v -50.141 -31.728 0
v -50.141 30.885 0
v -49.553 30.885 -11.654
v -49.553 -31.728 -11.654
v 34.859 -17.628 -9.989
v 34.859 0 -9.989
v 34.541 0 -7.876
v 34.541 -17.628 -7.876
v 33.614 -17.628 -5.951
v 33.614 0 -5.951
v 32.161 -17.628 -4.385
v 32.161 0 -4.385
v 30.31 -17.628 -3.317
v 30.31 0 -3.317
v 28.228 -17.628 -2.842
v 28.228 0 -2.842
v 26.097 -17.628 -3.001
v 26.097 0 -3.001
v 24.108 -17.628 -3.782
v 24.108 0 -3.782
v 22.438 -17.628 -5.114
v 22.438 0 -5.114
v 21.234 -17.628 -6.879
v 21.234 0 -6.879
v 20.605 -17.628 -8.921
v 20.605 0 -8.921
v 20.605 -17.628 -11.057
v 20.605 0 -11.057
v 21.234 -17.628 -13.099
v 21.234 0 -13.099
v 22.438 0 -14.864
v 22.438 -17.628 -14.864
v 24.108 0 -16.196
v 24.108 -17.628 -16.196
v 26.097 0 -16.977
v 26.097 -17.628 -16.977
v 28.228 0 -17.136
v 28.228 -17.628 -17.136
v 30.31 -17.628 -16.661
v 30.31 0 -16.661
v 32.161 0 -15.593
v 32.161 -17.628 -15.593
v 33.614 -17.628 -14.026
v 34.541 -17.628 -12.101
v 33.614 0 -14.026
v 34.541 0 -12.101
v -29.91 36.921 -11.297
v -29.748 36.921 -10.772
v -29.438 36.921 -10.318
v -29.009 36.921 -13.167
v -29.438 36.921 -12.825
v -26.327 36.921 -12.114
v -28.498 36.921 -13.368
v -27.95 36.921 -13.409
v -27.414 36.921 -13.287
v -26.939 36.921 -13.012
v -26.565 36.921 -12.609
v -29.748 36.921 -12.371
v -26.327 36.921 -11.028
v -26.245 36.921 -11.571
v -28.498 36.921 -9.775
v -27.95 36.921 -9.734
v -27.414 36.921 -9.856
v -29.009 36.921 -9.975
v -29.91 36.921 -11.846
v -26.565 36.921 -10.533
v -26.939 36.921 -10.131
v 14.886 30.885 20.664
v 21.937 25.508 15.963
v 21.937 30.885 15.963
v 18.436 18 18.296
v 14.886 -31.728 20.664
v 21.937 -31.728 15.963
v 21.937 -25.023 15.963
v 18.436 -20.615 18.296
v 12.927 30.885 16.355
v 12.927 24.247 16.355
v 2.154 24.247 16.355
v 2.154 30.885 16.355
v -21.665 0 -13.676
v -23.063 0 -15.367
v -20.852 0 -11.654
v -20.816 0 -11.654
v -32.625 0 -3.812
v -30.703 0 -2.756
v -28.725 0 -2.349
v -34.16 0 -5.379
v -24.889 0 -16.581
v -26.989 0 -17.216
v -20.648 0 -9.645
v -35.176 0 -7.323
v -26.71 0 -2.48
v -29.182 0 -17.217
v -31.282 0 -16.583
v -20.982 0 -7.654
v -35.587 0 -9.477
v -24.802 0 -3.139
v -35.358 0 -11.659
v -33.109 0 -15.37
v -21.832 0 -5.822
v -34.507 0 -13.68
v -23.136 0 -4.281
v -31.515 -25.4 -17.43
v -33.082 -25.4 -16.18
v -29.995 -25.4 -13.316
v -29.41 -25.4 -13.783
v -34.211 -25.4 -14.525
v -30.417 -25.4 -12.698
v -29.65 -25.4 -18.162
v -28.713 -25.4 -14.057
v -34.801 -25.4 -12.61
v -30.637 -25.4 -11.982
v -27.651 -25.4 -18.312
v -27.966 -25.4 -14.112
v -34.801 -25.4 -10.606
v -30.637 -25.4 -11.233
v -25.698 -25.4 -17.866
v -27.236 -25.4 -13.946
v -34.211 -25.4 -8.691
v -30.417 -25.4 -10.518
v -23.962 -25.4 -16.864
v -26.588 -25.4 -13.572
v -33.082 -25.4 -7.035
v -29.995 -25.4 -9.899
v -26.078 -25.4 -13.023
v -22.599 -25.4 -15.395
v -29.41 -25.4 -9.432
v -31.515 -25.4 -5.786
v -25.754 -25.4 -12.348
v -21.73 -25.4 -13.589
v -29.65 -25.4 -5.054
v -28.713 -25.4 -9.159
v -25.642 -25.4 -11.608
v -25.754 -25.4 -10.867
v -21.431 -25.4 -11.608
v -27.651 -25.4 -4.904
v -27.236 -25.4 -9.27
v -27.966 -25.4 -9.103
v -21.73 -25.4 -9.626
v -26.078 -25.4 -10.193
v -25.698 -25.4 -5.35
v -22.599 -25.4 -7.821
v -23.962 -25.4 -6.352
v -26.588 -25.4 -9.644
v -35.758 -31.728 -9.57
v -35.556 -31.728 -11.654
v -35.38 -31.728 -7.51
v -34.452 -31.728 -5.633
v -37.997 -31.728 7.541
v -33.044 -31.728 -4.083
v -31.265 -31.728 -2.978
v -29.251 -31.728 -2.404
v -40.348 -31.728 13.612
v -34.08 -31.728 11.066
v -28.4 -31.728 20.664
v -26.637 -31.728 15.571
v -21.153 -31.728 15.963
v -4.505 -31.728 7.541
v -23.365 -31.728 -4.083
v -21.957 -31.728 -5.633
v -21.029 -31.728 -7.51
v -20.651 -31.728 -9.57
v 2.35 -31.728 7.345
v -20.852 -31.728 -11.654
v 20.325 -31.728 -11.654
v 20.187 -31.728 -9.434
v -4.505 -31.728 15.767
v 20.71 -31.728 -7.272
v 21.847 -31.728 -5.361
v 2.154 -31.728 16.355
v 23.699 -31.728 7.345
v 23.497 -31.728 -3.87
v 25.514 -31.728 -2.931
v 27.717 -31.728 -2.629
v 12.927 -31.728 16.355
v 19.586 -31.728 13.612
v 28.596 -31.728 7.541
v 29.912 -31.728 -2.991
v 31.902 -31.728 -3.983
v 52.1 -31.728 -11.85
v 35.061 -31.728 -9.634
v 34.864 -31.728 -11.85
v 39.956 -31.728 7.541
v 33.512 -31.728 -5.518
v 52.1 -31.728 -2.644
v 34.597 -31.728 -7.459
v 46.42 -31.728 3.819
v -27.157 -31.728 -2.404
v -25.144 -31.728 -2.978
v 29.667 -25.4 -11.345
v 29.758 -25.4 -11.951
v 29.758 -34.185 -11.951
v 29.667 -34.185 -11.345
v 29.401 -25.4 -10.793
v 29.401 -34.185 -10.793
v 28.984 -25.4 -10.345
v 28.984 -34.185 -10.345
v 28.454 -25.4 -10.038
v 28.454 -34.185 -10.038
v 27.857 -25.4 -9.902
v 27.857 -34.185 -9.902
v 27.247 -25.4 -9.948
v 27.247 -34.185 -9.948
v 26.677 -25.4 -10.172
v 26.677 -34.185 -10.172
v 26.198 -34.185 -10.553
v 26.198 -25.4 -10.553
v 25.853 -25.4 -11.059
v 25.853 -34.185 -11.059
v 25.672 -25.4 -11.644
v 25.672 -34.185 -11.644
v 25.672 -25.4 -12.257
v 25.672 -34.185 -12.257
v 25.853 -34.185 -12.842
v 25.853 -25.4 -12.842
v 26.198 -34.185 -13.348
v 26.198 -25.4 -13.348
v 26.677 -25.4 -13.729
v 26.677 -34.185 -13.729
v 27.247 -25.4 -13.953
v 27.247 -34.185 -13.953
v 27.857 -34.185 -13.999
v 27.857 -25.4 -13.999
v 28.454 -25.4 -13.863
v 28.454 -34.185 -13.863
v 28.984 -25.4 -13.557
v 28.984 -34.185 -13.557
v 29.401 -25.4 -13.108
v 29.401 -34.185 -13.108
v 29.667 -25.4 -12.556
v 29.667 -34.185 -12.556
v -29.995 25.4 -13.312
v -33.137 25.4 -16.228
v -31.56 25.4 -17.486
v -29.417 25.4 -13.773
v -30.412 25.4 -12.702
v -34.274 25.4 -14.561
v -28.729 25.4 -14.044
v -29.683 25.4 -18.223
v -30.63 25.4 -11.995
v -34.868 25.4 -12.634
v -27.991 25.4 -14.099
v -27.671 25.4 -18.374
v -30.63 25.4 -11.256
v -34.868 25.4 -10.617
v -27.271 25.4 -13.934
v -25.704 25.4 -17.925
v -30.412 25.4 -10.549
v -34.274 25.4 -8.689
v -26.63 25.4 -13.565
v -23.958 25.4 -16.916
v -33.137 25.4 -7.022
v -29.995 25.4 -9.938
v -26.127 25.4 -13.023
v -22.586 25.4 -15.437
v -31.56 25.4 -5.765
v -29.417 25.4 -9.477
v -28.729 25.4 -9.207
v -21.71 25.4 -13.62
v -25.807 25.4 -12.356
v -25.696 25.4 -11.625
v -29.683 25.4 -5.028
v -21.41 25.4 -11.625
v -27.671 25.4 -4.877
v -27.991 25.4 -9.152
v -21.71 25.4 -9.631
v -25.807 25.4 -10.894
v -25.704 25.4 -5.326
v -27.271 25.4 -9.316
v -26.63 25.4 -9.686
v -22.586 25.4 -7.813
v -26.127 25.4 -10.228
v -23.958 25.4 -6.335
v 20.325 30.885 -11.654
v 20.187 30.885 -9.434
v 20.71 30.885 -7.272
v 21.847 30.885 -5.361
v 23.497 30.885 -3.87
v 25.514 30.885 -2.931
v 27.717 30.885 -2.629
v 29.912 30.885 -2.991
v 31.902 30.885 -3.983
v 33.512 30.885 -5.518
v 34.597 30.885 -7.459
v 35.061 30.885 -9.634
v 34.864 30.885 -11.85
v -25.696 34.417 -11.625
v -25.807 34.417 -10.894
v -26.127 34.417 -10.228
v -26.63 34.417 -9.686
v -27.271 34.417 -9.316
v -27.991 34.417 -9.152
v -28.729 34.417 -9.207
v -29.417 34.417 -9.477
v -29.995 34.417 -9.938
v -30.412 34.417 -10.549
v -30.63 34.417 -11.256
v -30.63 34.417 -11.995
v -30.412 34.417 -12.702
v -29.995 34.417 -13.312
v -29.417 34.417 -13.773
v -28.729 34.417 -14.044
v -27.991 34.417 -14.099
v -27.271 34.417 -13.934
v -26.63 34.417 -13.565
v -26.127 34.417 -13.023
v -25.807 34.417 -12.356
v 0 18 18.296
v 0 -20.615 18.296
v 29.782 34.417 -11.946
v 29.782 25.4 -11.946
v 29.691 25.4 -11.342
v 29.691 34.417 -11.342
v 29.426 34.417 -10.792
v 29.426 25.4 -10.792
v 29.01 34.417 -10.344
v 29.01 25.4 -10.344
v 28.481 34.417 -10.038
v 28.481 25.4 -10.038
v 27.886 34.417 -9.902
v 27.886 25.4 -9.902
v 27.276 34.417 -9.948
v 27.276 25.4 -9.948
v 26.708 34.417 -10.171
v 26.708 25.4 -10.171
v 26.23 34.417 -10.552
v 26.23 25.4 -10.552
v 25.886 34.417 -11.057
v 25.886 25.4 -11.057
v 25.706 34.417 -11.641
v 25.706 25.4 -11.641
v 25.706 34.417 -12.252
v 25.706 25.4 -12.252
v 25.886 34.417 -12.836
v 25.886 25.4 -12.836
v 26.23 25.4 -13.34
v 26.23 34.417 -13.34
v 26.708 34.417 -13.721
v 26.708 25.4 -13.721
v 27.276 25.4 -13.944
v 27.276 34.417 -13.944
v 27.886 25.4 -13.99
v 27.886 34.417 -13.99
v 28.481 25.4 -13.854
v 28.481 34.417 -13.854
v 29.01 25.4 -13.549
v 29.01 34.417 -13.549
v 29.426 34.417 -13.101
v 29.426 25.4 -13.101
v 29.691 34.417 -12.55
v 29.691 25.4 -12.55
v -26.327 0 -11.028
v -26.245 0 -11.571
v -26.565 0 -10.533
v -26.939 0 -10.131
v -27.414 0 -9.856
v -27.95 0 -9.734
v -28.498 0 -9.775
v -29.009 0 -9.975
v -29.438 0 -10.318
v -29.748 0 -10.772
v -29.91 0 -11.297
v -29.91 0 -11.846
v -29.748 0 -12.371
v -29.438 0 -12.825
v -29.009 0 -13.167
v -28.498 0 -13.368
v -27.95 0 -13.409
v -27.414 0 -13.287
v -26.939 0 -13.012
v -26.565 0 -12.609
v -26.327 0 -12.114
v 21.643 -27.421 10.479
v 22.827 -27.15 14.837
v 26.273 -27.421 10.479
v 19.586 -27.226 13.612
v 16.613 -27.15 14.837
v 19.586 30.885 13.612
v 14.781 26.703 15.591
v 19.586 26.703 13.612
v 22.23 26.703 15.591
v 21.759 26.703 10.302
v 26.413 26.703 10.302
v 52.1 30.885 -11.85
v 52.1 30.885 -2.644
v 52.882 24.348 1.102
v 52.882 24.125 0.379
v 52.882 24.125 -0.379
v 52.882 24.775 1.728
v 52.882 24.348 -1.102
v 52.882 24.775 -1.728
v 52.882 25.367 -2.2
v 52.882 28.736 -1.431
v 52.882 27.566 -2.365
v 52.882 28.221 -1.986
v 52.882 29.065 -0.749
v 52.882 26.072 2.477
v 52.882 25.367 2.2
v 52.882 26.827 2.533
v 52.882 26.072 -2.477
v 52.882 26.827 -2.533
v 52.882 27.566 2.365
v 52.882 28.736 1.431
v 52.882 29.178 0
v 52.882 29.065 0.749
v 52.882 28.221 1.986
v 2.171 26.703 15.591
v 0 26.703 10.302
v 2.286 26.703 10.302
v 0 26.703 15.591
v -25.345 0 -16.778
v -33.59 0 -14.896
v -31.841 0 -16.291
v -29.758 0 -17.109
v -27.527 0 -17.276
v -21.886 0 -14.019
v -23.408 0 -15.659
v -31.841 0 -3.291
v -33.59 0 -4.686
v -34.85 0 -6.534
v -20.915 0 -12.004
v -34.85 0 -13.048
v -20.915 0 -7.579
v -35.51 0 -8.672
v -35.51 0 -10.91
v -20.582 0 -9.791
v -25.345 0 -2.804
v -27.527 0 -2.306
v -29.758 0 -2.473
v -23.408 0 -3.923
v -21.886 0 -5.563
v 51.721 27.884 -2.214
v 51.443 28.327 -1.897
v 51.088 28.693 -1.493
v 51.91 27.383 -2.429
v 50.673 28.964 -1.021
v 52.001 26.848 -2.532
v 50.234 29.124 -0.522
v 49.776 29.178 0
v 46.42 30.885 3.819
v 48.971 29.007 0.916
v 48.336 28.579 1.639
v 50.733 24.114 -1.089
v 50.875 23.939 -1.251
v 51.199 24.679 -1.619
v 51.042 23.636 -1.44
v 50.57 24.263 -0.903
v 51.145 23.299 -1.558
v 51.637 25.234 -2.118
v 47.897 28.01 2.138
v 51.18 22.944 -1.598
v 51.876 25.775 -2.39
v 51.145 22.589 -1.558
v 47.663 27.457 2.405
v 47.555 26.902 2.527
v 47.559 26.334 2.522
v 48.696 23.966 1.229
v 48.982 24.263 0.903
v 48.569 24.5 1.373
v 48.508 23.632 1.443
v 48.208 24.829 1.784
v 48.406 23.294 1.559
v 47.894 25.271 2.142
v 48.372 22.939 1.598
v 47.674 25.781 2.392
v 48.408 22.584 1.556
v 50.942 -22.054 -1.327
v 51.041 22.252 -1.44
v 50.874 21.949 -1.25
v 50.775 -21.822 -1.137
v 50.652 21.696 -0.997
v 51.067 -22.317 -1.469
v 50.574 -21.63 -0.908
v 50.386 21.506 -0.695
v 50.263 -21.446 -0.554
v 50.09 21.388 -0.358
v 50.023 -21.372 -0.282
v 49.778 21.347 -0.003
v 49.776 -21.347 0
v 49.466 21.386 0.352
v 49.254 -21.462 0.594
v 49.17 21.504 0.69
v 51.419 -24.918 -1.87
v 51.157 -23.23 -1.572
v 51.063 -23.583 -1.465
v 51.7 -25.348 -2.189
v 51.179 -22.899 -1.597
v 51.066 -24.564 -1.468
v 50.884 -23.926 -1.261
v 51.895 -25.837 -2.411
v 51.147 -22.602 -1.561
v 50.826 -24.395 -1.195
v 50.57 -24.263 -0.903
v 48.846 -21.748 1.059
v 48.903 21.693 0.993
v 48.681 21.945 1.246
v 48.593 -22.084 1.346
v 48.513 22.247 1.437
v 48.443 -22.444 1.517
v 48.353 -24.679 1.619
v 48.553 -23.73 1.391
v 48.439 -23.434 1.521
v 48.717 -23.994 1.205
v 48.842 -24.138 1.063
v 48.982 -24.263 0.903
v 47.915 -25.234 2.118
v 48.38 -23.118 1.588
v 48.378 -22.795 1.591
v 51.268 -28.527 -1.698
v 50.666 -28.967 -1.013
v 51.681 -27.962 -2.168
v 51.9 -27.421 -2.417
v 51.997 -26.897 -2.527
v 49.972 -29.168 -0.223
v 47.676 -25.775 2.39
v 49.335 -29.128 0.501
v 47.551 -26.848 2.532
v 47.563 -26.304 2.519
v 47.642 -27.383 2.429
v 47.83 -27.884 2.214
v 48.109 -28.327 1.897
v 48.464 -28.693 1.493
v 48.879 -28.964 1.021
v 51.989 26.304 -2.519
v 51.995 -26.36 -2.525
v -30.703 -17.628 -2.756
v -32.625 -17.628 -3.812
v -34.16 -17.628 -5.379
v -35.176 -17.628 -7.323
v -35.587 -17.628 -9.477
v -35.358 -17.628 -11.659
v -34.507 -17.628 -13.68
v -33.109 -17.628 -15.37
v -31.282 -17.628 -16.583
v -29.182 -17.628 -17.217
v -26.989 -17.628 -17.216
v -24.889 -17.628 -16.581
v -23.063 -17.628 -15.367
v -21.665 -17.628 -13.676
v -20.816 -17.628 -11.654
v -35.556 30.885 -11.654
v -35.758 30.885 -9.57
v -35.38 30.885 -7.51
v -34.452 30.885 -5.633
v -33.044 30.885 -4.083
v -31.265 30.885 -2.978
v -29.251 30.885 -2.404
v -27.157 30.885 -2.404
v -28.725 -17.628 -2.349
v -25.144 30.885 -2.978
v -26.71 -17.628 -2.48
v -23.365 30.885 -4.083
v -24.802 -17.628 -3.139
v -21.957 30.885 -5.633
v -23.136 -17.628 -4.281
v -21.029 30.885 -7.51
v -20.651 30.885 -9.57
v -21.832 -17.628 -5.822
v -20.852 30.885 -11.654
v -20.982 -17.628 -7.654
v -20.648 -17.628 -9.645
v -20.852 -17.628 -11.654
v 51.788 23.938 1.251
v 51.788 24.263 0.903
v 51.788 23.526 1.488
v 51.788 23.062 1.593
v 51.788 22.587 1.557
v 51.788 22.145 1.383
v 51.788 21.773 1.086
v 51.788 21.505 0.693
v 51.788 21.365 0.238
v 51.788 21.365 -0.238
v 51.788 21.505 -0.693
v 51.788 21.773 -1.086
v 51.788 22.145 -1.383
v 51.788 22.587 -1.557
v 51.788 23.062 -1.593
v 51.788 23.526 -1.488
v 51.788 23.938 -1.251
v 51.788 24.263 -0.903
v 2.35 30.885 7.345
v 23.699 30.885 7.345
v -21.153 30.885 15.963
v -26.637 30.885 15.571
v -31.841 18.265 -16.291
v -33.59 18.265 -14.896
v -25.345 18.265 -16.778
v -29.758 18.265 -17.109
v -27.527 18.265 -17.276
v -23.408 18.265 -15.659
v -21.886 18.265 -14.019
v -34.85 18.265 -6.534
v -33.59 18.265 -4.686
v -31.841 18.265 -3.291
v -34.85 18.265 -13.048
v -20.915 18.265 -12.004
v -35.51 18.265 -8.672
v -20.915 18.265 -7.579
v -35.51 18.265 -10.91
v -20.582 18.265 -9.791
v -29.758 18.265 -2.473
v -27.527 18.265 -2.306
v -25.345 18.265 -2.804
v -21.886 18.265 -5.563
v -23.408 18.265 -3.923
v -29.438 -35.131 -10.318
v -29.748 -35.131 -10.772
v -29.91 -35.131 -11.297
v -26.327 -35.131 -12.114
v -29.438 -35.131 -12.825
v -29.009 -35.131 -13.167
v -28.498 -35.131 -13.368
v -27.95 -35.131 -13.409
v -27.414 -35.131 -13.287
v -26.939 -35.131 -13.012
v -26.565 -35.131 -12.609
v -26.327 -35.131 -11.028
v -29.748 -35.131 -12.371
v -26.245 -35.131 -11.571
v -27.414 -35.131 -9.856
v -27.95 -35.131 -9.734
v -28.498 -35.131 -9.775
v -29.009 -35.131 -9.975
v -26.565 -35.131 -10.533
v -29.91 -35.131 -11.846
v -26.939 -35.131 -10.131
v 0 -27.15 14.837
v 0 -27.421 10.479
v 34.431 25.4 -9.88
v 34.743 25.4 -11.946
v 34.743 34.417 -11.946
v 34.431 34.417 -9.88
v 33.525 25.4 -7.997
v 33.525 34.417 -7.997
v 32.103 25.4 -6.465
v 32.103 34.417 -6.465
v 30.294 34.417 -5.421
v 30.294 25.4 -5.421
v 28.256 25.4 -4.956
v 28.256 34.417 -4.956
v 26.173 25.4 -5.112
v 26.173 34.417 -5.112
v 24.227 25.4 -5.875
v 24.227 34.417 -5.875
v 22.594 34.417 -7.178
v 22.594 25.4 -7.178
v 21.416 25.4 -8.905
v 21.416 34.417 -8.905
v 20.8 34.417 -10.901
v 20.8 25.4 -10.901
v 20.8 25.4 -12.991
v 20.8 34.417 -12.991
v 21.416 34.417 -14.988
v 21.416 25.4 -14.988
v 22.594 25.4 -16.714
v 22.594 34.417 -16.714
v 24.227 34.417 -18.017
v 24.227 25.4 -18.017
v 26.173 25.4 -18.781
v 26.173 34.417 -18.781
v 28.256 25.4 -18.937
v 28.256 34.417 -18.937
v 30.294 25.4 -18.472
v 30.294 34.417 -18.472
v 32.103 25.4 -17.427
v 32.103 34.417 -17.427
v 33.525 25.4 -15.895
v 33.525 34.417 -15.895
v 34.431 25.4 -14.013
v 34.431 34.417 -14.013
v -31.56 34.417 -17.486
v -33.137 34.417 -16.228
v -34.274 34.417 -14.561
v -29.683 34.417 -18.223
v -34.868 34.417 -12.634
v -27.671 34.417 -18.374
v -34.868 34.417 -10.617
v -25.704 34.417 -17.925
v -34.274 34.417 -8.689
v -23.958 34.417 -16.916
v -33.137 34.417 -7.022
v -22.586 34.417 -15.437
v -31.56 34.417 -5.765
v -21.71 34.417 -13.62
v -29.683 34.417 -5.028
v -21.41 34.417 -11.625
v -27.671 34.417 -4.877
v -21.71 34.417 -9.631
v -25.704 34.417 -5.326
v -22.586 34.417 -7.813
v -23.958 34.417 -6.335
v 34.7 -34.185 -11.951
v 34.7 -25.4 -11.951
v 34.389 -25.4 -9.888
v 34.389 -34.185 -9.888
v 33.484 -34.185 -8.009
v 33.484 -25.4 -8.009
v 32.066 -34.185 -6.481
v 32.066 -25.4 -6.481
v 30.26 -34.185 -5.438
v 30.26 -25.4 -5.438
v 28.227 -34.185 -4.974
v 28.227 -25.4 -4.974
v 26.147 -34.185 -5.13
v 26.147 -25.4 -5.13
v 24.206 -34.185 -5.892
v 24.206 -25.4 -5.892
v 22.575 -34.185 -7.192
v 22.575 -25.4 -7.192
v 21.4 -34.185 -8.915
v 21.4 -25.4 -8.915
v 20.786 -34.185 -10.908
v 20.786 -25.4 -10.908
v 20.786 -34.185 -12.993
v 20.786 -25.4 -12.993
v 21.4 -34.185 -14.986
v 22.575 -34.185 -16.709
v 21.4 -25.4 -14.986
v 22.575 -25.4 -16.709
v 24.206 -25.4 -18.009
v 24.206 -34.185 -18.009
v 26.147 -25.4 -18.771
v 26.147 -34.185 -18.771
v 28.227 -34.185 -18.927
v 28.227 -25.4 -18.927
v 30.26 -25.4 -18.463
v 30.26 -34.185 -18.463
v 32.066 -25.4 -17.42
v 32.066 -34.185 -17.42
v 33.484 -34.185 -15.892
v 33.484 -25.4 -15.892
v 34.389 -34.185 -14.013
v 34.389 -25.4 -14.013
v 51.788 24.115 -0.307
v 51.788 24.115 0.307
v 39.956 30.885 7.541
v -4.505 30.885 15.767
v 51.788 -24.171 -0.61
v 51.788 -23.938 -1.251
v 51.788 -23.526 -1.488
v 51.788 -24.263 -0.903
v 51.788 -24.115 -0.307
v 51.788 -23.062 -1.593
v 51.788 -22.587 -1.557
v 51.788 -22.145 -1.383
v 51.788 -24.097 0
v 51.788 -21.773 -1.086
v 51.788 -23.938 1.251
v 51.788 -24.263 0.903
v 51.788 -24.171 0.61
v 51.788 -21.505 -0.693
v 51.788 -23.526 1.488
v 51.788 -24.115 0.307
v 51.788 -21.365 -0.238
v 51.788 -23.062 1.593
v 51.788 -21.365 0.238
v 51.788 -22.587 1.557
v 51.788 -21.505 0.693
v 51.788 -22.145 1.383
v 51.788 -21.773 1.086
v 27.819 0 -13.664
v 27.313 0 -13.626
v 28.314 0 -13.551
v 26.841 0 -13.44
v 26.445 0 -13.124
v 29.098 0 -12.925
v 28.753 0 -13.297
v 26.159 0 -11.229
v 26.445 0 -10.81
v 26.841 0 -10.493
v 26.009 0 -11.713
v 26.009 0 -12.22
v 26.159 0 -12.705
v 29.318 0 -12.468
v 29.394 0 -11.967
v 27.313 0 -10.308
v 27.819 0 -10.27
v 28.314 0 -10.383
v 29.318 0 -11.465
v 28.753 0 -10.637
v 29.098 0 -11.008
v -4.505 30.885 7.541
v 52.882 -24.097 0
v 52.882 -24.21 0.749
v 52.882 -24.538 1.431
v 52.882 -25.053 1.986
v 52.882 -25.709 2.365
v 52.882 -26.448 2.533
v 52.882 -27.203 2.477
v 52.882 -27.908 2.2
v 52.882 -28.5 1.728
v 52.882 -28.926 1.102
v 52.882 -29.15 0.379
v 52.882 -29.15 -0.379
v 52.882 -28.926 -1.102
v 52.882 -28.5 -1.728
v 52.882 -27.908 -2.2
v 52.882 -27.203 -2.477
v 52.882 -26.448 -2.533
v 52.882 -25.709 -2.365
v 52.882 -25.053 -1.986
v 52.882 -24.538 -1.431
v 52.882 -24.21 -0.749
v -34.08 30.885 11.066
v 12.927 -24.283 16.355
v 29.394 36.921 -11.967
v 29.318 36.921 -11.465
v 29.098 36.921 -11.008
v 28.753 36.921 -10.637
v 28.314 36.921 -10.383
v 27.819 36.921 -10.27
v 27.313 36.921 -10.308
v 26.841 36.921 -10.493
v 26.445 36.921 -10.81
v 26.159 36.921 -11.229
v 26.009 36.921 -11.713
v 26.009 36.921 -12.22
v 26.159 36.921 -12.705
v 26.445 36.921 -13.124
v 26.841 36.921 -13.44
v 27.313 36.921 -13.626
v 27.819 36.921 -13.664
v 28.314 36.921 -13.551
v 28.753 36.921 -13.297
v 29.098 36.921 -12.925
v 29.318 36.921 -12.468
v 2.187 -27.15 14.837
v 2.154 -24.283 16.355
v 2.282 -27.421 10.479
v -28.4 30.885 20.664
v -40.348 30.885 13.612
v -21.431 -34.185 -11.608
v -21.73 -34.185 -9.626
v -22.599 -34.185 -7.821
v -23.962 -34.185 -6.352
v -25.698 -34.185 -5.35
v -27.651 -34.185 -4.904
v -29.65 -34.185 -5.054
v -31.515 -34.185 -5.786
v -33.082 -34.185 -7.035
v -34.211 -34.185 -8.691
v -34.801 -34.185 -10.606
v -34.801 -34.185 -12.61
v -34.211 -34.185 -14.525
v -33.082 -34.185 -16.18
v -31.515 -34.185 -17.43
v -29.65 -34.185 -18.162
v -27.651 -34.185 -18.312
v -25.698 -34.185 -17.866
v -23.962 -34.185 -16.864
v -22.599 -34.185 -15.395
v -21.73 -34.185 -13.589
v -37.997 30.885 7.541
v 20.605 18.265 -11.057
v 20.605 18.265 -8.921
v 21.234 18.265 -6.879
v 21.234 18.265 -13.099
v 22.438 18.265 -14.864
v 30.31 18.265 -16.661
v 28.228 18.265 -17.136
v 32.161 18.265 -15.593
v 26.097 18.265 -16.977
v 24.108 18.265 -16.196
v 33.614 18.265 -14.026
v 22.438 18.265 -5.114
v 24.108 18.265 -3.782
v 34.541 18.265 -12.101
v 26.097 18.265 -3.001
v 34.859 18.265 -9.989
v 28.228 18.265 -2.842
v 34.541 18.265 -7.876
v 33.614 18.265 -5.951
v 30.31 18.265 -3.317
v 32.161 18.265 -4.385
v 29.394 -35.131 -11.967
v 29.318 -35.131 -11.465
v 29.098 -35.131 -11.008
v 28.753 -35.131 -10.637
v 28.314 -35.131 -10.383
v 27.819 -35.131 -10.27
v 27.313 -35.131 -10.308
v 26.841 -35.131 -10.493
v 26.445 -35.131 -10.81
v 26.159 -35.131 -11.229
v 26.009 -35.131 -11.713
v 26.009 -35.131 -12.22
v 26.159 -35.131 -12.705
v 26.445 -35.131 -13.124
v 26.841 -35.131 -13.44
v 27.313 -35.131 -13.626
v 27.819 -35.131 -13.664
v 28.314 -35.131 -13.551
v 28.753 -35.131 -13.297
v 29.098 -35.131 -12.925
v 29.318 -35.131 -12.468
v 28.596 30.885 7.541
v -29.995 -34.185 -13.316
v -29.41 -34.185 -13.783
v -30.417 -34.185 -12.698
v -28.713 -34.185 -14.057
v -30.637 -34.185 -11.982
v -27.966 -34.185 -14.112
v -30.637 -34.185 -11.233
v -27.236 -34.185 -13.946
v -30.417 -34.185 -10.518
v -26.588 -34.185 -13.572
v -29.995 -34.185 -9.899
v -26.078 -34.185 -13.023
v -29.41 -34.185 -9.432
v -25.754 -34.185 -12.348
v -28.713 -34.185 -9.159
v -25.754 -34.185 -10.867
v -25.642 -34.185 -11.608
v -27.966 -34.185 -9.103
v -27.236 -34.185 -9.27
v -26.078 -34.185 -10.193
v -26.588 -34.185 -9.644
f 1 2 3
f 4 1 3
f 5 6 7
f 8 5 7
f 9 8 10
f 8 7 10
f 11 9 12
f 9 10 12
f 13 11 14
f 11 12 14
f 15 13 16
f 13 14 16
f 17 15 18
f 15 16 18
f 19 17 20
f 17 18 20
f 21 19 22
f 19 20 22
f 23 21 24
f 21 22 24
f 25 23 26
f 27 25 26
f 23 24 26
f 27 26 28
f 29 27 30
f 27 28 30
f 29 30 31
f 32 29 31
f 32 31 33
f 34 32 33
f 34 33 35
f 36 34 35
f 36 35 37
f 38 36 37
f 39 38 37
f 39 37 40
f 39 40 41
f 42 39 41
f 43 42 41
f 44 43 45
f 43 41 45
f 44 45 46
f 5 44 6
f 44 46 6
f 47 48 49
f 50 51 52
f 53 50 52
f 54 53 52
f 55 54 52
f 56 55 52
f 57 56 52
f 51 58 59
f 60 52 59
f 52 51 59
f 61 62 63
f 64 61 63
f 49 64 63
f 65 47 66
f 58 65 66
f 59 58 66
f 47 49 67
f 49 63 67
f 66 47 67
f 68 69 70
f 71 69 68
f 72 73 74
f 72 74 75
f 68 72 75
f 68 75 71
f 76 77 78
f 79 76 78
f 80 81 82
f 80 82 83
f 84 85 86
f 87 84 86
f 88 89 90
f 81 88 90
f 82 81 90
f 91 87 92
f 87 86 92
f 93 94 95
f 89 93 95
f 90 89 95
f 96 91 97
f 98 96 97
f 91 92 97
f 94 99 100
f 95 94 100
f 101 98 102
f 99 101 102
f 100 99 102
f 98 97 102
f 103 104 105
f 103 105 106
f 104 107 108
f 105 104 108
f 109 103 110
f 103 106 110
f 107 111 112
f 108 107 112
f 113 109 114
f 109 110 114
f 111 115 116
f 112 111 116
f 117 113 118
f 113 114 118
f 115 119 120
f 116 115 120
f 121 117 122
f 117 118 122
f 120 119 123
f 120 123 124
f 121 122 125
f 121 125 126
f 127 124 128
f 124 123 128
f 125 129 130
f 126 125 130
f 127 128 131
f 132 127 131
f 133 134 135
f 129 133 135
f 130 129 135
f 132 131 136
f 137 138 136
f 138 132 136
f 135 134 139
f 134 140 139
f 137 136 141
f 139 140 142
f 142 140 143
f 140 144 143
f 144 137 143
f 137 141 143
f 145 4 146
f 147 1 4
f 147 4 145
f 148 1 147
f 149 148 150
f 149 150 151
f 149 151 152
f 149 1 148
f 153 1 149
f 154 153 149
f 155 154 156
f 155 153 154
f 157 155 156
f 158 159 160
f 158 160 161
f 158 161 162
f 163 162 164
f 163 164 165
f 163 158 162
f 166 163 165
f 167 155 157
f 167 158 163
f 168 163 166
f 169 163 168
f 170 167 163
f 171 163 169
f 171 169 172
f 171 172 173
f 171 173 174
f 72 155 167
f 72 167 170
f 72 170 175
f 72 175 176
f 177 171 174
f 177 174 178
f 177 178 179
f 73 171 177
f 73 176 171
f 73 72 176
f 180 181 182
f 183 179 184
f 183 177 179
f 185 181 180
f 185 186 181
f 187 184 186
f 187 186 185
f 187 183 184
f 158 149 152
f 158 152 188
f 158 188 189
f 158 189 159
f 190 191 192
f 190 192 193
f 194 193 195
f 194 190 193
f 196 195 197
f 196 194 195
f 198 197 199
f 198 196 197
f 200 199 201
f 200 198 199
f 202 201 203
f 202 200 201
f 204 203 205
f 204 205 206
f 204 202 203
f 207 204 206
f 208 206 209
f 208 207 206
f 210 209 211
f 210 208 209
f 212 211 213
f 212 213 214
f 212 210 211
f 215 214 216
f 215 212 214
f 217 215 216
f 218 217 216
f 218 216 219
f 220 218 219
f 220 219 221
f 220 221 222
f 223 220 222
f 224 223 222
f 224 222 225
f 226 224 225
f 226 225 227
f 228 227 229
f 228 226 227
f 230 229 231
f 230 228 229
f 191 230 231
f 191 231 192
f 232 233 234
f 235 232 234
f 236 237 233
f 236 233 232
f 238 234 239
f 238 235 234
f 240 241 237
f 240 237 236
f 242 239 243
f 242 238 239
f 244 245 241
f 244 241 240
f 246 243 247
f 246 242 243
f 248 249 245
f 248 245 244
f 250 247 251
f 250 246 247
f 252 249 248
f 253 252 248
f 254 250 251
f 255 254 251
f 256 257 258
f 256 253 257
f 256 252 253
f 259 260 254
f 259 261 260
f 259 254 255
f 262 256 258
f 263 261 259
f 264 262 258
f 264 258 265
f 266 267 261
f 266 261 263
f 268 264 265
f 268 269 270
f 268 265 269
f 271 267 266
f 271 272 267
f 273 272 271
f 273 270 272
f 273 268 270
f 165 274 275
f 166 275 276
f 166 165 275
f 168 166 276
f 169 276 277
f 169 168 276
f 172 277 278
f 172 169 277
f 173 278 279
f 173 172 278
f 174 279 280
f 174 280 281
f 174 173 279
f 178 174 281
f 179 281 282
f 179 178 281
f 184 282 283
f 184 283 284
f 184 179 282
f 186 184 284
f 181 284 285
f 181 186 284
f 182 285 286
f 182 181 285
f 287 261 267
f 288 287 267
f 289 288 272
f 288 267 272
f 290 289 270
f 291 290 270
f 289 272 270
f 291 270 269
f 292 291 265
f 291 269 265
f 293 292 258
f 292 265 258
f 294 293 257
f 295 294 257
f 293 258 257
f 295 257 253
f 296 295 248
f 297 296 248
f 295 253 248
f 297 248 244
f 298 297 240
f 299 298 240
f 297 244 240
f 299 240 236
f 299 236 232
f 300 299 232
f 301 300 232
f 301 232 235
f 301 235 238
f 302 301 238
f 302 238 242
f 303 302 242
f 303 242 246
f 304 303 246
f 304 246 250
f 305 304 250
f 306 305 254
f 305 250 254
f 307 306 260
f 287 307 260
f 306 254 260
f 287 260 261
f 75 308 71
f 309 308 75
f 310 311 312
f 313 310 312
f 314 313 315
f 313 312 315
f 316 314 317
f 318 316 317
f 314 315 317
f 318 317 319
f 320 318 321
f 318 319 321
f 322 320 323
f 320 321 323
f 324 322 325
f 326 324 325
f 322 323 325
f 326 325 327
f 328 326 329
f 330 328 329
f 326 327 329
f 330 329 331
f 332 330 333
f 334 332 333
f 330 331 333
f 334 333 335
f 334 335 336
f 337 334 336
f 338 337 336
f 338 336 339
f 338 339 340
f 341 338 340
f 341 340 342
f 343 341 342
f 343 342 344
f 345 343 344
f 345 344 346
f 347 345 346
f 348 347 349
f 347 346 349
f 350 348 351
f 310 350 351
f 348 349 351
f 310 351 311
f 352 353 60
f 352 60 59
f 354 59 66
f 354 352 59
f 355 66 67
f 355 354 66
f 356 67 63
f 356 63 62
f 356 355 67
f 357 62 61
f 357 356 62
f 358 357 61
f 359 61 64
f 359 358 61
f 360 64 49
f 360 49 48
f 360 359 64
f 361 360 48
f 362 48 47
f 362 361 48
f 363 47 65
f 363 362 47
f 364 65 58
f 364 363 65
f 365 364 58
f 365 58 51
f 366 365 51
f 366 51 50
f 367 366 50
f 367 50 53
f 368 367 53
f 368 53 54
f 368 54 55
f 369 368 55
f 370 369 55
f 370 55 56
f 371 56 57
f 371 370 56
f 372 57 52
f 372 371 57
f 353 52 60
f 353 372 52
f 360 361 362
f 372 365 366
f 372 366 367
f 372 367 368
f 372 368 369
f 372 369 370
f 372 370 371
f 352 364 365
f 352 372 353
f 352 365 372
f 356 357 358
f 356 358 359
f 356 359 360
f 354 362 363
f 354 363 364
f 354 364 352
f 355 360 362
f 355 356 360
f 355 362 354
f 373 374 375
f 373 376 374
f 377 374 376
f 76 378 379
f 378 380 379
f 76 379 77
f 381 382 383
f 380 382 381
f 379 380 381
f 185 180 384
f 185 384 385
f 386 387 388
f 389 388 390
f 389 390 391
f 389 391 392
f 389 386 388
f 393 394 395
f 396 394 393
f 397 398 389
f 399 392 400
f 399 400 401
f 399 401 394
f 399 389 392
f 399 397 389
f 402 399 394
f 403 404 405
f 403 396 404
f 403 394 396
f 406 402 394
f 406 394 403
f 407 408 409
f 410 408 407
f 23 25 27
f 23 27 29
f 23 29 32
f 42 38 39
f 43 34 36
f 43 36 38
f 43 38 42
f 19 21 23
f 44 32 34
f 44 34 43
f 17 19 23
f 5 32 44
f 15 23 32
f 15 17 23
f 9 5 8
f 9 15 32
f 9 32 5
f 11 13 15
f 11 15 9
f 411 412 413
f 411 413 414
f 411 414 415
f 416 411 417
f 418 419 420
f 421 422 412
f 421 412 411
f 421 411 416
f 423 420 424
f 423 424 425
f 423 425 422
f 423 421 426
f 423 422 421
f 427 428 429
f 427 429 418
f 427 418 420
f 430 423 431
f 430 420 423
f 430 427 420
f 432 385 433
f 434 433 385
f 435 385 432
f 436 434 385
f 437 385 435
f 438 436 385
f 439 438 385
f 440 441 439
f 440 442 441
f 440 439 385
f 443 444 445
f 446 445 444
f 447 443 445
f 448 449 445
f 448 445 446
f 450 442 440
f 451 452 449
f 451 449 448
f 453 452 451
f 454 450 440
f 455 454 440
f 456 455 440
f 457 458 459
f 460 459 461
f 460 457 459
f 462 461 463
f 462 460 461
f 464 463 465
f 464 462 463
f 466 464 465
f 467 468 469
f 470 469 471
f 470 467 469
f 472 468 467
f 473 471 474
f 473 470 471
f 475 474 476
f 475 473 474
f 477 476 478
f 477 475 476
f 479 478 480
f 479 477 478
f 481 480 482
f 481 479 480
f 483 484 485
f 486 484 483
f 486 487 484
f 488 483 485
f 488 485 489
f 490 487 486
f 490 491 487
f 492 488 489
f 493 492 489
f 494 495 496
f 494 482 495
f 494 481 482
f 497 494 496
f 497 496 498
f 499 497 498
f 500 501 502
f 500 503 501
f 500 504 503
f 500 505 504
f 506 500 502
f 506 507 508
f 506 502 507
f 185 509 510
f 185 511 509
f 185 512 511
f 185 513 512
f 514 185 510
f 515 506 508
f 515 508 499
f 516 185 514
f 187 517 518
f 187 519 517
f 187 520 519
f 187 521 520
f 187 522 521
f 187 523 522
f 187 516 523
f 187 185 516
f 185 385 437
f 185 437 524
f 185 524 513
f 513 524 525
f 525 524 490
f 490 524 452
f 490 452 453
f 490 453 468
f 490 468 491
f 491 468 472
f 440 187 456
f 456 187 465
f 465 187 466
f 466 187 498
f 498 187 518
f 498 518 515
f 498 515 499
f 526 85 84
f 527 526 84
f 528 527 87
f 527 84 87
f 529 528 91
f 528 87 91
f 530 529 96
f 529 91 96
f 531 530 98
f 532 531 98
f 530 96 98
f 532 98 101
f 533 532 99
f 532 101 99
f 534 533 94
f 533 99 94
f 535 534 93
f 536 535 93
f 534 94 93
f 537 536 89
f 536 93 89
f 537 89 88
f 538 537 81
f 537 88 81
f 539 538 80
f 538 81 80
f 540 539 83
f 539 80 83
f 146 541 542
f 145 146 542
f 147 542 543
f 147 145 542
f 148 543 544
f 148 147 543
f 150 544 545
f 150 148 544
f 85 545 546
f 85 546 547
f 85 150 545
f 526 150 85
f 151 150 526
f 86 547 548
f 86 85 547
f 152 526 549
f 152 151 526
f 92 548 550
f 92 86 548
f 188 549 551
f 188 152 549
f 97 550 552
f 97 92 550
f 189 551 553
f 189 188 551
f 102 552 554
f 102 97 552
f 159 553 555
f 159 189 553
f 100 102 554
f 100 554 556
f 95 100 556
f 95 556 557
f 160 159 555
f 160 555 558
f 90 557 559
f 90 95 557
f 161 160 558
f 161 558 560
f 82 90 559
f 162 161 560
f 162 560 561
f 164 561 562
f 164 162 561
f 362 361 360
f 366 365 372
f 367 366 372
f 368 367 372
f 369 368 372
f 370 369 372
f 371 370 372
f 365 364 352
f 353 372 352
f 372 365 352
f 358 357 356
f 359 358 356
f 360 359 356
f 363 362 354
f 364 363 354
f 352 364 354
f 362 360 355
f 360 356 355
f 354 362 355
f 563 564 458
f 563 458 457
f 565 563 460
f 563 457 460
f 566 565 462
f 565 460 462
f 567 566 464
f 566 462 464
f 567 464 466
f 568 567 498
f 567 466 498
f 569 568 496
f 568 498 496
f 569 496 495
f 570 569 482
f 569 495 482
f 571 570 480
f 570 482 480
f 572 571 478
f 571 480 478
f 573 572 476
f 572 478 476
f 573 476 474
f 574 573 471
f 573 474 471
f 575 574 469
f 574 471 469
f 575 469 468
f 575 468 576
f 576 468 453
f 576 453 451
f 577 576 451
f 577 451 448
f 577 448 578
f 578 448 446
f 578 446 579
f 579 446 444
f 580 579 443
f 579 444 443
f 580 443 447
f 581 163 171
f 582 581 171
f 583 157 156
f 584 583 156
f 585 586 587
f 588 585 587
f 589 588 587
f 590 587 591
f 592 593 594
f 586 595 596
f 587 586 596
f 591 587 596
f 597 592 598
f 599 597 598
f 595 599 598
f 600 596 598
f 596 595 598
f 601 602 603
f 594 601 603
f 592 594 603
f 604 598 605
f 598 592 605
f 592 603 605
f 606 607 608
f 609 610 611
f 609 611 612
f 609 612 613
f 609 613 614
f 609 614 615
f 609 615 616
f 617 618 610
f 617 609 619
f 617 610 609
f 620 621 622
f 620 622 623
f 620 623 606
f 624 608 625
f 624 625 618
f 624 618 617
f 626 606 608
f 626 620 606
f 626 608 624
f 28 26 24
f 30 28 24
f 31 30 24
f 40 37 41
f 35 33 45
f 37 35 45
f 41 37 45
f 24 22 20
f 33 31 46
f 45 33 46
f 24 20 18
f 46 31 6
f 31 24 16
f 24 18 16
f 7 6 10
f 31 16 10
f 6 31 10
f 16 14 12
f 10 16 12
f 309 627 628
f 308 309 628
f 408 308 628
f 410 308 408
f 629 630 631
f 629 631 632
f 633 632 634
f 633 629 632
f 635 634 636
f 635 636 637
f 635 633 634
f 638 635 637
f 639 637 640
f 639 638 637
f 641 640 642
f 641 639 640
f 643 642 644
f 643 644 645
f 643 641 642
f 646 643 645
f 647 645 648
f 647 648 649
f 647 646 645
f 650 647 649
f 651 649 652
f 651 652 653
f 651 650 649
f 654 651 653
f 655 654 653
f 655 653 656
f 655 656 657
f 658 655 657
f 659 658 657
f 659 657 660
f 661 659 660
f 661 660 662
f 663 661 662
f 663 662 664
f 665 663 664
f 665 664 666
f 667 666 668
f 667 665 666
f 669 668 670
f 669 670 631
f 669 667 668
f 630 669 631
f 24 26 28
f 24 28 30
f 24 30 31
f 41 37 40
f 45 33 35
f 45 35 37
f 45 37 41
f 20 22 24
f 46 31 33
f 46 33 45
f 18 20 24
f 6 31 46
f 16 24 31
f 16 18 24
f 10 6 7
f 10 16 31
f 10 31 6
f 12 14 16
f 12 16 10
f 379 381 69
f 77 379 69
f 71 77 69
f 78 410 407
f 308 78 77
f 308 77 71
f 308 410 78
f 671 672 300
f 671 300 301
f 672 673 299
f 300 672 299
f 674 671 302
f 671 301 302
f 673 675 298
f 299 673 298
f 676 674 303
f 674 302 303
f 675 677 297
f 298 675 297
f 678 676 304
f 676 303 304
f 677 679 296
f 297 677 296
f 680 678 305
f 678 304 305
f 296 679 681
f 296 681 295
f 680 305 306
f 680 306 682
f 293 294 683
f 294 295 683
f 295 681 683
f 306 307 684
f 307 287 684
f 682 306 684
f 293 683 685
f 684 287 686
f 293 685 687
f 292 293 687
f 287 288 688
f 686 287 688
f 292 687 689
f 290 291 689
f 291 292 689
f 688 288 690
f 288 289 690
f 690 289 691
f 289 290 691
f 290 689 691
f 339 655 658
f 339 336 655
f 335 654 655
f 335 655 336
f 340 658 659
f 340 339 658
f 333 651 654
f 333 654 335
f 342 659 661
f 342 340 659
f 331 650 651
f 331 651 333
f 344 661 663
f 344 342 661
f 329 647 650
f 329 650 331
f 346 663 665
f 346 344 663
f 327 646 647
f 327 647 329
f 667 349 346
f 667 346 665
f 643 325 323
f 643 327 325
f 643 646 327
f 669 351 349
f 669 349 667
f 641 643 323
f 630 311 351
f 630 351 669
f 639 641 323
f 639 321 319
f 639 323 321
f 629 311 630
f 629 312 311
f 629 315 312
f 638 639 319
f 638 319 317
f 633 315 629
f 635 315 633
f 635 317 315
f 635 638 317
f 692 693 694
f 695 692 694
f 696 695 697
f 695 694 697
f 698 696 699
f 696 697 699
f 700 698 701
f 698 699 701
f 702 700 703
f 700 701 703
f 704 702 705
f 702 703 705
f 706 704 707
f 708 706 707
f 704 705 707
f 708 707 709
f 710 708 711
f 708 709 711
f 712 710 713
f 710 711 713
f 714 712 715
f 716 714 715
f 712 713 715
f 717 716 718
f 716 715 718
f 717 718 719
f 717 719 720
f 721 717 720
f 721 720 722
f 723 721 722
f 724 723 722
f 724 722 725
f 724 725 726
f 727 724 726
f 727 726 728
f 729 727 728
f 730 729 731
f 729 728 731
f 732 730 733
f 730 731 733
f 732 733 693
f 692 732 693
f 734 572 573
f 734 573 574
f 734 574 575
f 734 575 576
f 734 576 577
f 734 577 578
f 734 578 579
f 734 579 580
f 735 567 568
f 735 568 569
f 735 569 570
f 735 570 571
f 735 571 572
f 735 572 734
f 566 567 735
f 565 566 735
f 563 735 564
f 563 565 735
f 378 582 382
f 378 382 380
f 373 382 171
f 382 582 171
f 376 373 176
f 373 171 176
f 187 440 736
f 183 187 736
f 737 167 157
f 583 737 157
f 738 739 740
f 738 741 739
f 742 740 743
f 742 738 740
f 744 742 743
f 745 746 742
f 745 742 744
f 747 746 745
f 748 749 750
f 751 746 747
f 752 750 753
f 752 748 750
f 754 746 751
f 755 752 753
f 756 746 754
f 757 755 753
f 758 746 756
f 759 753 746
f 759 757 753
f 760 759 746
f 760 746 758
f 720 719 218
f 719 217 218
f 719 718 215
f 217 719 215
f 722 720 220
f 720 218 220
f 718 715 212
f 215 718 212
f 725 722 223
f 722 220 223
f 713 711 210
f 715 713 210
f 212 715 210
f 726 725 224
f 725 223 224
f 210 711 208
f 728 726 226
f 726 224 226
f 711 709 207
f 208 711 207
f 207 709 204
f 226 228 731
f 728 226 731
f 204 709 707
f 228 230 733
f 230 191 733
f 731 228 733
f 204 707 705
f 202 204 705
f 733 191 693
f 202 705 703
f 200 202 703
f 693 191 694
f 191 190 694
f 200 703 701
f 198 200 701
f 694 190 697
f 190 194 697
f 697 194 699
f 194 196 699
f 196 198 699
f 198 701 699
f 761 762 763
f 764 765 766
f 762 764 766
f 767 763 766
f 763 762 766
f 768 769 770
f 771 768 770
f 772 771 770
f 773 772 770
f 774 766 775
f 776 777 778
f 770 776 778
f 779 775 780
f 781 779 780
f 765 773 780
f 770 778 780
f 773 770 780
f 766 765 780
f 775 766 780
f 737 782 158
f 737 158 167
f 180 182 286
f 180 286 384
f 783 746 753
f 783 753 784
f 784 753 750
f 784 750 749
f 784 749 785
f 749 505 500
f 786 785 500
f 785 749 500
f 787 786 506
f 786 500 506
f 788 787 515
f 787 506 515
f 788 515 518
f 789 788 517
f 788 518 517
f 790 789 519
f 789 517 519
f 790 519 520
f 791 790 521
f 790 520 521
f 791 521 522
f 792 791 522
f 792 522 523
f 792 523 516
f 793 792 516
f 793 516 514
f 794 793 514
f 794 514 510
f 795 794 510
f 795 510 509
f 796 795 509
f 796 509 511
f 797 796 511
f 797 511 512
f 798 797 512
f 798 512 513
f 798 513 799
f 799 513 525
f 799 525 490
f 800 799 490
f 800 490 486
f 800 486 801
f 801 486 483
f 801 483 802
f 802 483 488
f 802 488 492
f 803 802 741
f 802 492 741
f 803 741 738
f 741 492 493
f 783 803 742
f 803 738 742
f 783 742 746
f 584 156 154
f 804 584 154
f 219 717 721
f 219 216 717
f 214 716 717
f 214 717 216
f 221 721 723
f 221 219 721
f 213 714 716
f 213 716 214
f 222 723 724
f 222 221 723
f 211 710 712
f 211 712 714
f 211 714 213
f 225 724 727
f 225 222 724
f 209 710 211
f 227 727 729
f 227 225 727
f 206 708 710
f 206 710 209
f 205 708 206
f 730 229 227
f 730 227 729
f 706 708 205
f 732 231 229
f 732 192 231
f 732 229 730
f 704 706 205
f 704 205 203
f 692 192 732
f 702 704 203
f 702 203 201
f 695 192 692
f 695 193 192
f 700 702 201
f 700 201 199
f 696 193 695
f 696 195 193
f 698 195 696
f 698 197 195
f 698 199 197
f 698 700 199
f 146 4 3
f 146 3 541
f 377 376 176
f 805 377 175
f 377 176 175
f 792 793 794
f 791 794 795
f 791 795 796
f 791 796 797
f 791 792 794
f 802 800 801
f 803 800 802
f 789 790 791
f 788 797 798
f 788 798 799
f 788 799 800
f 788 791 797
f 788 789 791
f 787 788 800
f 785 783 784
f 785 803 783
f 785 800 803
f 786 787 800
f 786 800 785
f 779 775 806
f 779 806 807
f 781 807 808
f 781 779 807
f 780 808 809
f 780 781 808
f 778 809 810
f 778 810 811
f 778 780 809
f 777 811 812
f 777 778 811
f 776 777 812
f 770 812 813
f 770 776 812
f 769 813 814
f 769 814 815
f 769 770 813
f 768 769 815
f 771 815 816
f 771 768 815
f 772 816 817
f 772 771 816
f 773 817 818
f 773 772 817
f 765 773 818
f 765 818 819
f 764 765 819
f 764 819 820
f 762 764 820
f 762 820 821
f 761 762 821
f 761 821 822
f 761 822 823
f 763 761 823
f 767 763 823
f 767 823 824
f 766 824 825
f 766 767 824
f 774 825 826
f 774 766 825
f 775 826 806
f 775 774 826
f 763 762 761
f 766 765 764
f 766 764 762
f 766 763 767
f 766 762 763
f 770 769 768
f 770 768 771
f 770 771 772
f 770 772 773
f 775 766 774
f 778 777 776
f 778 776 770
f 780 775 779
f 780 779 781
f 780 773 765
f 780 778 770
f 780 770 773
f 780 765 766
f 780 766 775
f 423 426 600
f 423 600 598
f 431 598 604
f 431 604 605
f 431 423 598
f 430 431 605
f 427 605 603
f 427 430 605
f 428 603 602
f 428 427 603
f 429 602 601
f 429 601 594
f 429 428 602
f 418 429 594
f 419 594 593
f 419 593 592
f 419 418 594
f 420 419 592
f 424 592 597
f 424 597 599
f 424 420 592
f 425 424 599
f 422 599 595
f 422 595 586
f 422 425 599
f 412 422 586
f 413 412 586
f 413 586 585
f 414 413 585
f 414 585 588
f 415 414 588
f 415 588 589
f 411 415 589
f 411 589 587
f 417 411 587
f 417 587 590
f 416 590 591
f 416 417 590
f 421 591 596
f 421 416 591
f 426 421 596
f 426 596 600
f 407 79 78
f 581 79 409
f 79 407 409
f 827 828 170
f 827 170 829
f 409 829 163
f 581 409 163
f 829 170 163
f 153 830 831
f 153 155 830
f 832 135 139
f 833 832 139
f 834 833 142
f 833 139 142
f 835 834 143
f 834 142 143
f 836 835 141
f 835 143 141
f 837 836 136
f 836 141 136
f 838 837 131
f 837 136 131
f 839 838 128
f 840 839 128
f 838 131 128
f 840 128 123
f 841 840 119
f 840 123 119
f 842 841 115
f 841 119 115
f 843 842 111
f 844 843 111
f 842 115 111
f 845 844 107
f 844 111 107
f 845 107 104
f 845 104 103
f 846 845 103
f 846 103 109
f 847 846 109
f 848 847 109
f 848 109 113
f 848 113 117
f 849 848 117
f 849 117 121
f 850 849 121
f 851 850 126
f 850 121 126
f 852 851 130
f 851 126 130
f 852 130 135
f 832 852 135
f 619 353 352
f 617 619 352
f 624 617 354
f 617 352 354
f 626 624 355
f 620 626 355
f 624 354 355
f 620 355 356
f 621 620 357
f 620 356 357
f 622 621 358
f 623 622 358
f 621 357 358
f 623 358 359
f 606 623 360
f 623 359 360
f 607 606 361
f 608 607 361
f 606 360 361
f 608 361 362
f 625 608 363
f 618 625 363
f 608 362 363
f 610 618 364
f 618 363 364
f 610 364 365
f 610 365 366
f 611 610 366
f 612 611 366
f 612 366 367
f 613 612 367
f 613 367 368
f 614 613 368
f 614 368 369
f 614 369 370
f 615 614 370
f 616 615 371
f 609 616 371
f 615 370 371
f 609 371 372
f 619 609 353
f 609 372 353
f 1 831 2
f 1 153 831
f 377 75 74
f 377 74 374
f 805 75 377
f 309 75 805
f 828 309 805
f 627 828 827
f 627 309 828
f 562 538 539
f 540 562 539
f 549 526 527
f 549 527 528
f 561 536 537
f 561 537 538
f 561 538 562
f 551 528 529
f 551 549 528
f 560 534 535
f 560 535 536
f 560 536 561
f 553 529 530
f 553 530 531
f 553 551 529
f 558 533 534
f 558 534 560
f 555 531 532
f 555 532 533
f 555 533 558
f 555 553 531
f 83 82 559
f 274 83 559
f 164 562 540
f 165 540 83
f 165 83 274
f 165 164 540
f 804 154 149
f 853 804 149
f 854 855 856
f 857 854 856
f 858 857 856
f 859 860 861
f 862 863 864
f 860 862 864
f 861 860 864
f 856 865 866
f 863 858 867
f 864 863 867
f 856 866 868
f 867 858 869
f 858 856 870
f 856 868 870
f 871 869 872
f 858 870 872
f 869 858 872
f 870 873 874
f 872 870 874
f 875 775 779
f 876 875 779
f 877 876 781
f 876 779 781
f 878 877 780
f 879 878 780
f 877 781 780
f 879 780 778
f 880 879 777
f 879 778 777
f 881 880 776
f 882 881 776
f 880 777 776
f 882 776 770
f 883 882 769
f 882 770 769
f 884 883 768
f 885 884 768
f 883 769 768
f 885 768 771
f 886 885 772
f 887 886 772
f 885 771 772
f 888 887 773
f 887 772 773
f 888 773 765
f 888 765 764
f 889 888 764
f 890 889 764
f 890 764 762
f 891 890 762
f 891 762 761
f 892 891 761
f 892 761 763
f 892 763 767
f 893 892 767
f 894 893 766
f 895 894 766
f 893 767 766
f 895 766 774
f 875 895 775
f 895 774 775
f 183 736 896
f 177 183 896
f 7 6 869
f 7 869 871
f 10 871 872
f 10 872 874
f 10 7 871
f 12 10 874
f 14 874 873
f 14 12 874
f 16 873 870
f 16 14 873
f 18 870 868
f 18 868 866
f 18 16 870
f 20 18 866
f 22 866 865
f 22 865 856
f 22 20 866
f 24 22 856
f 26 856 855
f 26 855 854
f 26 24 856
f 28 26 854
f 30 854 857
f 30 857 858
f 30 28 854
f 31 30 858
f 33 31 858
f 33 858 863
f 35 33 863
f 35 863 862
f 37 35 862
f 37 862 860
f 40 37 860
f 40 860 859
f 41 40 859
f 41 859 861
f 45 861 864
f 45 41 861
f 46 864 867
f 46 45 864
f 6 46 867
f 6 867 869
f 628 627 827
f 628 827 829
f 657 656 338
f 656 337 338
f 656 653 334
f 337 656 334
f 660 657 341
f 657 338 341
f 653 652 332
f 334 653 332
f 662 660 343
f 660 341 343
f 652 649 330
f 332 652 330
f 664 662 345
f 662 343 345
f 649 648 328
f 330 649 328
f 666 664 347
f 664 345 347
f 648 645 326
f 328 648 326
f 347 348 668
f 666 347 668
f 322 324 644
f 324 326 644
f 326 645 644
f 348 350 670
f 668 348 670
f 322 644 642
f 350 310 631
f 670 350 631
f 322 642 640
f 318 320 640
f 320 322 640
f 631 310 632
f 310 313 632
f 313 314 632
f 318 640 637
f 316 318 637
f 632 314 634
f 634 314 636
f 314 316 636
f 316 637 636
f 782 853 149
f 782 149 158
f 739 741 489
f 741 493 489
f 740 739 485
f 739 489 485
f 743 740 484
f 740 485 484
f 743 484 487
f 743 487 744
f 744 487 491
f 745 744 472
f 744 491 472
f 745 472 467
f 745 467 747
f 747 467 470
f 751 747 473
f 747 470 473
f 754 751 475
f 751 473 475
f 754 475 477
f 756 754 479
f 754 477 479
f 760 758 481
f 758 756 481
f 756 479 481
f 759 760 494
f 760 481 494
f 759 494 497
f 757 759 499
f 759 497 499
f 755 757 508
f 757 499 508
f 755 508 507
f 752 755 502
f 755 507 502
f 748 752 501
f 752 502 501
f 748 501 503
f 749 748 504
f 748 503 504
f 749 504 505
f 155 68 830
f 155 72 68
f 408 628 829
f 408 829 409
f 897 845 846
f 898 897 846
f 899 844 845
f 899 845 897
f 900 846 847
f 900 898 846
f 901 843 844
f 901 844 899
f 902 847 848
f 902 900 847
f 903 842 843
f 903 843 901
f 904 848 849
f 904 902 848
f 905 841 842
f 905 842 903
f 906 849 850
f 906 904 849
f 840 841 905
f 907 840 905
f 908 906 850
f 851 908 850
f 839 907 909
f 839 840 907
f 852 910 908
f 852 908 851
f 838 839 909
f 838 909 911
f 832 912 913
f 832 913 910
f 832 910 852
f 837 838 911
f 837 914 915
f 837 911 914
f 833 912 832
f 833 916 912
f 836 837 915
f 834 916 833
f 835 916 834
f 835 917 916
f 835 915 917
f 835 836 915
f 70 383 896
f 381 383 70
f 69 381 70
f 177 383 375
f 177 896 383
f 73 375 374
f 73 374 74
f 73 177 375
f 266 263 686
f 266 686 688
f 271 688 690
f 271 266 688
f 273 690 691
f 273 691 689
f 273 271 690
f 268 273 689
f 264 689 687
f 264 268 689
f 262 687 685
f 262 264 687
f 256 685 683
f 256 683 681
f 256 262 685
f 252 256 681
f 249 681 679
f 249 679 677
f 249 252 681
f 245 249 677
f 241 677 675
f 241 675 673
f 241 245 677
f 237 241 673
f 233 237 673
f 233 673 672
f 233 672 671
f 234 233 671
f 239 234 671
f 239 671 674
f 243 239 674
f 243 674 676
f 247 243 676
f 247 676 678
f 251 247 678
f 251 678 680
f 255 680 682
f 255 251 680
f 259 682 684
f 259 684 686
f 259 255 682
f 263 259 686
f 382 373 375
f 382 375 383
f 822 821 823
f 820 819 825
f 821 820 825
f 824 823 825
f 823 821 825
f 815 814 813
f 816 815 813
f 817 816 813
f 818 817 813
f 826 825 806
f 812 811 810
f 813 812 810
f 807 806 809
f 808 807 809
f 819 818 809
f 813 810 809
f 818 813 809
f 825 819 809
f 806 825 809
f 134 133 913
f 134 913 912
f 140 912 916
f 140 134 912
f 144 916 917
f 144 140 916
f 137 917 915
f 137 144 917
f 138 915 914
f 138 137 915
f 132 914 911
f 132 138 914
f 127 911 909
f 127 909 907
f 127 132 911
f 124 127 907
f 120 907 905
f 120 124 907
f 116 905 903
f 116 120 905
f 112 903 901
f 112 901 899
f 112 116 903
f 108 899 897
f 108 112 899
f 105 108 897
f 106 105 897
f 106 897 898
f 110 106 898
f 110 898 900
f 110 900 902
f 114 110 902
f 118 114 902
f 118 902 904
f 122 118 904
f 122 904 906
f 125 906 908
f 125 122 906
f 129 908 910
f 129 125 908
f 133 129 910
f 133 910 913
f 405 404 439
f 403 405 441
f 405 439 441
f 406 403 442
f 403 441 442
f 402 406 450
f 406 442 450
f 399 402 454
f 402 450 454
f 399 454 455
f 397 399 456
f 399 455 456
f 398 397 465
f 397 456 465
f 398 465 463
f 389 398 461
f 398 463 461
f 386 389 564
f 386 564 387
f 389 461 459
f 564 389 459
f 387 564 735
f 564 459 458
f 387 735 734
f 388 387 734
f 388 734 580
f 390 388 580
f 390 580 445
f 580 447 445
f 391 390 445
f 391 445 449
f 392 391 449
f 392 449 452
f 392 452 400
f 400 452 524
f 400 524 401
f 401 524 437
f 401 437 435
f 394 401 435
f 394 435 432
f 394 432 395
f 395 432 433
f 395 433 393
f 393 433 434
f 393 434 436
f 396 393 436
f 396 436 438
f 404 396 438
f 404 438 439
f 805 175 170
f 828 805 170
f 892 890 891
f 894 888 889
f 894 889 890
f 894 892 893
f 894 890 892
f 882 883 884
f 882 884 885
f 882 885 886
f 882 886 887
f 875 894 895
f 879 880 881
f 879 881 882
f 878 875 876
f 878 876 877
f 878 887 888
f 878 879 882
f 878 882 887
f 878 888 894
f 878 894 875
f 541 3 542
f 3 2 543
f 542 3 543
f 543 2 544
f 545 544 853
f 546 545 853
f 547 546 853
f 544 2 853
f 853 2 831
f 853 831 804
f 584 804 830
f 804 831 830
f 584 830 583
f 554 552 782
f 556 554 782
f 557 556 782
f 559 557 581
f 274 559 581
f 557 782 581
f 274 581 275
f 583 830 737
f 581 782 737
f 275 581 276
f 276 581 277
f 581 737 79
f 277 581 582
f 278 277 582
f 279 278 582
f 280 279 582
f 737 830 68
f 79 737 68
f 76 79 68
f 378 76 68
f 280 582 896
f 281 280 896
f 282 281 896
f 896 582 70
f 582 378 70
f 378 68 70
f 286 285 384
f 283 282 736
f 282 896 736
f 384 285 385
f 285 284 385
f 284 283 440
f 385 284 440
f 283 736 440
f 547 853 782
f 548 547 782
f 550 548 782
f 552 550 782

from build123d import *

# Parameters (mm, degrees)
F1_DEPTH  = 31.72759
F2_DEPTH  = 30.88454
F4_DEPTH  = 105.29166
F5_DEPTH  = 57.13206
F7_DEPTH  = 126.57516
F8_R      = 2.540562
F9_DEPTH  = 52.8818
F10_R     = 1.597776
F11_DEPTH = 51.78806
F12_R     = 7.167341
F12_R_2   = 7.505973
F13_DEPTH = 17.62756
F14_DEPTH = 18.26537
F15_R     = 1.701538
F15_R_2   = 1.842812
F16_DEPTH = 35.1313
F17_DEPTH = 36.92113
F20_R     = 6.72259
F20_R_2   = 2.511767
F20_R_3   = 6.996272
F20_R_4   = 2.054112
F21_DEPTH = 8.78482
F22_R     = 7.010266
F22_R_2   = 2.049618
F22_R_3   = 6.767141
F22_R_4   = 2.480427
F23_DEPTH = 9.01715


with BuildPart() as f1:
    # F0 (on Front) → F1 (new body)
    with BuildSketch(Plane.XZ):
        with BuildLine():
            Line((-40.347762, 13.612472), (-50.140906, 0))
            Line((-50.140906, 0), (-49.55332, -11.653843))
            Line((-49.55332, -11.653843), (-35.556299, -11.653843))
            ThreePointArc((-35.556299, -11.653843), (-28.20426, -2.330667), (-20.852222, -11.653843))
            Line((-20.852222, -11.653843), (20.324883, -11.653843))
            ThreePointArc((20.324883, -11.653843), (27.717136, -2.629378), (34.863597, -11.849707))
            Line((34.863597, -11.849707), (52.099533, -11.849707))
            Line((52.099533, -11.849707), (52.099533, -2.644149))
            Line((52.099533, -2.644149), (46.419512, 3.819327))
            Line((46.419512, 3.819327), (39.956037, 7.540722))
            Line((39.956037, 7.540722), (28.595982, 7.540722))
            Line((28.595982, 7.540722), (21.936648, 15.962828))
            Line((21.936648, 15.962828), (14.885582, 20.663537))
            Line((14.885582, 20.663537), (-28.400123, 20.663537))
            Line((-28.400123, 20.663537), (-40.347762, 13.612472))
        make_face()
    extrude(amount=F1_DEPTH)

    # F0 (on Front) → F2 (join)
    with BuildSketch(Plane.XZ):
        with BuildLine():
            Line((-40.347762, 13.612472), (-50.140906, 0))
            Line((-50.140906, 0), (-49.55332, -11.653843))
            Line((-49.55332, -11.653843), (-35.556299, -11.653843))
            ThreePointArc((-35.556299, -11.653843), (-28.20426, -2.330667), (-20.852222, -11.653843))
            Line((-20.852222, -11.653843), (20.324883, -11.653843))
            ThreePointArc((20.324883, -11.653843), (27.717136, -2.629378), (34.863597, -11.849707))
            Line((34.863597, -11.849707), (52.099533, -11.849707))
            Line((52.099533, -11.849707), (52.099533, -2.644149))
            Line((52.099533, -2.644149), (46.419512, 3.819327))
            Line((46.419512, 3.819327), (39.956037, 7.540722))
            Line((39.956037, 7.540722), (28.595982, 7.540722))
            Line((28.595982, 7.540722), (21.936648, 15.962828))
            Line((21.936648, 15.962828), (14.885582, 20.663537))
            Line((14.885582, 20.663537), (-28.400123, 20.663537))
            Line((-28.400123, 20.663537), (-40.347762, 13.612472))
        make_face()
    extrude(amount=-F2_DEPTH)

    # F3 (on Front) → F4 (cut)
    with BuildSketch(Plane.XZ):
        Polygon((12.926953, 16.354553), (2.154493, 16.354553), (2.350356, 7.344859), (23.699414, 7.344859), (19.586291, 13.612472), align=None)
        Polygon((-4.504845, 7.540722), (-4.504845, 15.766963), (-21.153195, 15.962828), (-26.637357, 15.571102), (-34.080148, 11.066255), (-37.997406, 7.540722), (-21.153195, 7.540722), align=None)
    extrude(amount=F4_DEPTH, mode=Mode.SUBTRACT)

    # F3 (on Front) → F5 (cut)
    with BuildSketch(Plane.XZ):
        Polygon((12.926953, 16.354553), (2.154493, 16.354553), (2.350356, 7.344859), (23.699414, 7.344859), (19.586291, 13.612472), align=None)
        Polygon((-4.504845, 7.540722), (-4.504845, 15.766963), (-21.153195, 15.962828), (-26.637357, 15.571102), (-34.080148, 11.066255), (-37.997406, 7.540722), (-21.153195, 7.540722), align=None)
    extrude(amount=-F5_DEPTH, mode=Mode.SUBTRACT)

    # F6 (on Right) → F7 (cut)
    with BuildSketch(Plane.YZ):
        Polygon((17.999778, 18.296476), (-20.614888, 18.296476), (-27.150005, 14.836709), (-27.420808, 10.478665), (26.70297, 10.30179), (26.70297, 15.591273), align=None)
    extrude(amount=F7_DEPTH, mode=Mode.SUBTRACT)

    # F8 (on Right) → F9 (join)
    with BuildSketch(Plane.YZ):
        with Locations((-26.637357, 0)):
            Circle(F8_R)
        with Locations((26.637357, 0)):
            Circle(F8_R)
    extrude(amount=F9_DEPTH)

    # F10 (on Right) → F11 (join)
    with BuildSketch(Plane.YZ):
        with Locations((-22.944771, 0)):
            Circle(F10_R)
        with Locations((22.944771, 0)):
            Circle(F10_R)
    extrude(amount=F11_DEPTH)

    # F12 (on Front) → F13 (join)
    with BuildSketch(Plane.XZ):
        with Locations((27.691966, -9.988888)):
            Circle(F12_R)
        with Locations((-28.087564, -9.791087)):
            Circle(F12_R_2)
    extrude(amount=F13_DEPTH)


with BuildPart() as f14:
    # F12 (on Front) → F14 (new body)
    with BuildSketch(Plane.XZ):
        with Locations((27.691966, -9.988888)):
            Circle(F12_R)
        with Locations((-28.087564, -9.791087)):
            Circle(F12_R_2)
    extrude(amount=-F14_DEPTH)


with BuildPart() as f16:
    # F15 (on Front) → F16 (new body)
    with BuildSketch(Plane.XZ):
        with Locations((27.691966, -11.966885)):
            Circle(F15_R)
        with Locations((-28.087564, -11.571286)):
            Circle(F15_R_2)
    extrude(amount=F16_DEPTH)


with BuildPart() as f17:
    # F15 (on Front) → F17 (new body)
    with BuildSketch(Plane.XZ):
        with Locations((27.691966, -11.966885)):
            Circle(F15_R)
        with Locations((-28.087564, -11.571286)):
            Circle(F15_R_2)
    extrude(amount=-F17_DEPTH)


with BuildPart() as f21:
    # F20 (on offset) → F21 (new body)
    with BuildSketch(Plane.XZ.offset(25.4)):
        with Locations((-28.153751, -11.607743)):
            Circle(F20_R)
        with Locations((-28.153751, -11.607743)):
            Circle(F20_R_2, mode=Mode.SUBTRACT)
        with Locations((27.703669, -11.95054)):
            Circle(F20_R_3)
        with Locations((27.703669, -11.95054)):
            Circle(F20_R_4, mode=Mode.SUBTRACT)
    extrude(amount=F21_DEPTH)


with BuildPart() as f23:
    # F22 (on offset) → F23 (new body)
    with BuildSketch(Plane.XZ.offset(-25.4)):
        with Locations((27.732449, -11.946245)):
            Circle(F22_R)
        with Locations((27.732449, -11.946245)):
            Circle(F22_R_2, mode=Mode.SUBTRACT)
        with Locations((-28.176781, -11.625309)):
            Circle(F22_R_3)
        with Locations((-28.176781, -11.625309)):
            Circle(F22_R_4, mode=Mode.SUBTRACT)
    extrude(amount=-F23_DEPTH)


solid = Compound([f1.part, f14.part, f16.part, f17.part, f21.part, f23.part])
